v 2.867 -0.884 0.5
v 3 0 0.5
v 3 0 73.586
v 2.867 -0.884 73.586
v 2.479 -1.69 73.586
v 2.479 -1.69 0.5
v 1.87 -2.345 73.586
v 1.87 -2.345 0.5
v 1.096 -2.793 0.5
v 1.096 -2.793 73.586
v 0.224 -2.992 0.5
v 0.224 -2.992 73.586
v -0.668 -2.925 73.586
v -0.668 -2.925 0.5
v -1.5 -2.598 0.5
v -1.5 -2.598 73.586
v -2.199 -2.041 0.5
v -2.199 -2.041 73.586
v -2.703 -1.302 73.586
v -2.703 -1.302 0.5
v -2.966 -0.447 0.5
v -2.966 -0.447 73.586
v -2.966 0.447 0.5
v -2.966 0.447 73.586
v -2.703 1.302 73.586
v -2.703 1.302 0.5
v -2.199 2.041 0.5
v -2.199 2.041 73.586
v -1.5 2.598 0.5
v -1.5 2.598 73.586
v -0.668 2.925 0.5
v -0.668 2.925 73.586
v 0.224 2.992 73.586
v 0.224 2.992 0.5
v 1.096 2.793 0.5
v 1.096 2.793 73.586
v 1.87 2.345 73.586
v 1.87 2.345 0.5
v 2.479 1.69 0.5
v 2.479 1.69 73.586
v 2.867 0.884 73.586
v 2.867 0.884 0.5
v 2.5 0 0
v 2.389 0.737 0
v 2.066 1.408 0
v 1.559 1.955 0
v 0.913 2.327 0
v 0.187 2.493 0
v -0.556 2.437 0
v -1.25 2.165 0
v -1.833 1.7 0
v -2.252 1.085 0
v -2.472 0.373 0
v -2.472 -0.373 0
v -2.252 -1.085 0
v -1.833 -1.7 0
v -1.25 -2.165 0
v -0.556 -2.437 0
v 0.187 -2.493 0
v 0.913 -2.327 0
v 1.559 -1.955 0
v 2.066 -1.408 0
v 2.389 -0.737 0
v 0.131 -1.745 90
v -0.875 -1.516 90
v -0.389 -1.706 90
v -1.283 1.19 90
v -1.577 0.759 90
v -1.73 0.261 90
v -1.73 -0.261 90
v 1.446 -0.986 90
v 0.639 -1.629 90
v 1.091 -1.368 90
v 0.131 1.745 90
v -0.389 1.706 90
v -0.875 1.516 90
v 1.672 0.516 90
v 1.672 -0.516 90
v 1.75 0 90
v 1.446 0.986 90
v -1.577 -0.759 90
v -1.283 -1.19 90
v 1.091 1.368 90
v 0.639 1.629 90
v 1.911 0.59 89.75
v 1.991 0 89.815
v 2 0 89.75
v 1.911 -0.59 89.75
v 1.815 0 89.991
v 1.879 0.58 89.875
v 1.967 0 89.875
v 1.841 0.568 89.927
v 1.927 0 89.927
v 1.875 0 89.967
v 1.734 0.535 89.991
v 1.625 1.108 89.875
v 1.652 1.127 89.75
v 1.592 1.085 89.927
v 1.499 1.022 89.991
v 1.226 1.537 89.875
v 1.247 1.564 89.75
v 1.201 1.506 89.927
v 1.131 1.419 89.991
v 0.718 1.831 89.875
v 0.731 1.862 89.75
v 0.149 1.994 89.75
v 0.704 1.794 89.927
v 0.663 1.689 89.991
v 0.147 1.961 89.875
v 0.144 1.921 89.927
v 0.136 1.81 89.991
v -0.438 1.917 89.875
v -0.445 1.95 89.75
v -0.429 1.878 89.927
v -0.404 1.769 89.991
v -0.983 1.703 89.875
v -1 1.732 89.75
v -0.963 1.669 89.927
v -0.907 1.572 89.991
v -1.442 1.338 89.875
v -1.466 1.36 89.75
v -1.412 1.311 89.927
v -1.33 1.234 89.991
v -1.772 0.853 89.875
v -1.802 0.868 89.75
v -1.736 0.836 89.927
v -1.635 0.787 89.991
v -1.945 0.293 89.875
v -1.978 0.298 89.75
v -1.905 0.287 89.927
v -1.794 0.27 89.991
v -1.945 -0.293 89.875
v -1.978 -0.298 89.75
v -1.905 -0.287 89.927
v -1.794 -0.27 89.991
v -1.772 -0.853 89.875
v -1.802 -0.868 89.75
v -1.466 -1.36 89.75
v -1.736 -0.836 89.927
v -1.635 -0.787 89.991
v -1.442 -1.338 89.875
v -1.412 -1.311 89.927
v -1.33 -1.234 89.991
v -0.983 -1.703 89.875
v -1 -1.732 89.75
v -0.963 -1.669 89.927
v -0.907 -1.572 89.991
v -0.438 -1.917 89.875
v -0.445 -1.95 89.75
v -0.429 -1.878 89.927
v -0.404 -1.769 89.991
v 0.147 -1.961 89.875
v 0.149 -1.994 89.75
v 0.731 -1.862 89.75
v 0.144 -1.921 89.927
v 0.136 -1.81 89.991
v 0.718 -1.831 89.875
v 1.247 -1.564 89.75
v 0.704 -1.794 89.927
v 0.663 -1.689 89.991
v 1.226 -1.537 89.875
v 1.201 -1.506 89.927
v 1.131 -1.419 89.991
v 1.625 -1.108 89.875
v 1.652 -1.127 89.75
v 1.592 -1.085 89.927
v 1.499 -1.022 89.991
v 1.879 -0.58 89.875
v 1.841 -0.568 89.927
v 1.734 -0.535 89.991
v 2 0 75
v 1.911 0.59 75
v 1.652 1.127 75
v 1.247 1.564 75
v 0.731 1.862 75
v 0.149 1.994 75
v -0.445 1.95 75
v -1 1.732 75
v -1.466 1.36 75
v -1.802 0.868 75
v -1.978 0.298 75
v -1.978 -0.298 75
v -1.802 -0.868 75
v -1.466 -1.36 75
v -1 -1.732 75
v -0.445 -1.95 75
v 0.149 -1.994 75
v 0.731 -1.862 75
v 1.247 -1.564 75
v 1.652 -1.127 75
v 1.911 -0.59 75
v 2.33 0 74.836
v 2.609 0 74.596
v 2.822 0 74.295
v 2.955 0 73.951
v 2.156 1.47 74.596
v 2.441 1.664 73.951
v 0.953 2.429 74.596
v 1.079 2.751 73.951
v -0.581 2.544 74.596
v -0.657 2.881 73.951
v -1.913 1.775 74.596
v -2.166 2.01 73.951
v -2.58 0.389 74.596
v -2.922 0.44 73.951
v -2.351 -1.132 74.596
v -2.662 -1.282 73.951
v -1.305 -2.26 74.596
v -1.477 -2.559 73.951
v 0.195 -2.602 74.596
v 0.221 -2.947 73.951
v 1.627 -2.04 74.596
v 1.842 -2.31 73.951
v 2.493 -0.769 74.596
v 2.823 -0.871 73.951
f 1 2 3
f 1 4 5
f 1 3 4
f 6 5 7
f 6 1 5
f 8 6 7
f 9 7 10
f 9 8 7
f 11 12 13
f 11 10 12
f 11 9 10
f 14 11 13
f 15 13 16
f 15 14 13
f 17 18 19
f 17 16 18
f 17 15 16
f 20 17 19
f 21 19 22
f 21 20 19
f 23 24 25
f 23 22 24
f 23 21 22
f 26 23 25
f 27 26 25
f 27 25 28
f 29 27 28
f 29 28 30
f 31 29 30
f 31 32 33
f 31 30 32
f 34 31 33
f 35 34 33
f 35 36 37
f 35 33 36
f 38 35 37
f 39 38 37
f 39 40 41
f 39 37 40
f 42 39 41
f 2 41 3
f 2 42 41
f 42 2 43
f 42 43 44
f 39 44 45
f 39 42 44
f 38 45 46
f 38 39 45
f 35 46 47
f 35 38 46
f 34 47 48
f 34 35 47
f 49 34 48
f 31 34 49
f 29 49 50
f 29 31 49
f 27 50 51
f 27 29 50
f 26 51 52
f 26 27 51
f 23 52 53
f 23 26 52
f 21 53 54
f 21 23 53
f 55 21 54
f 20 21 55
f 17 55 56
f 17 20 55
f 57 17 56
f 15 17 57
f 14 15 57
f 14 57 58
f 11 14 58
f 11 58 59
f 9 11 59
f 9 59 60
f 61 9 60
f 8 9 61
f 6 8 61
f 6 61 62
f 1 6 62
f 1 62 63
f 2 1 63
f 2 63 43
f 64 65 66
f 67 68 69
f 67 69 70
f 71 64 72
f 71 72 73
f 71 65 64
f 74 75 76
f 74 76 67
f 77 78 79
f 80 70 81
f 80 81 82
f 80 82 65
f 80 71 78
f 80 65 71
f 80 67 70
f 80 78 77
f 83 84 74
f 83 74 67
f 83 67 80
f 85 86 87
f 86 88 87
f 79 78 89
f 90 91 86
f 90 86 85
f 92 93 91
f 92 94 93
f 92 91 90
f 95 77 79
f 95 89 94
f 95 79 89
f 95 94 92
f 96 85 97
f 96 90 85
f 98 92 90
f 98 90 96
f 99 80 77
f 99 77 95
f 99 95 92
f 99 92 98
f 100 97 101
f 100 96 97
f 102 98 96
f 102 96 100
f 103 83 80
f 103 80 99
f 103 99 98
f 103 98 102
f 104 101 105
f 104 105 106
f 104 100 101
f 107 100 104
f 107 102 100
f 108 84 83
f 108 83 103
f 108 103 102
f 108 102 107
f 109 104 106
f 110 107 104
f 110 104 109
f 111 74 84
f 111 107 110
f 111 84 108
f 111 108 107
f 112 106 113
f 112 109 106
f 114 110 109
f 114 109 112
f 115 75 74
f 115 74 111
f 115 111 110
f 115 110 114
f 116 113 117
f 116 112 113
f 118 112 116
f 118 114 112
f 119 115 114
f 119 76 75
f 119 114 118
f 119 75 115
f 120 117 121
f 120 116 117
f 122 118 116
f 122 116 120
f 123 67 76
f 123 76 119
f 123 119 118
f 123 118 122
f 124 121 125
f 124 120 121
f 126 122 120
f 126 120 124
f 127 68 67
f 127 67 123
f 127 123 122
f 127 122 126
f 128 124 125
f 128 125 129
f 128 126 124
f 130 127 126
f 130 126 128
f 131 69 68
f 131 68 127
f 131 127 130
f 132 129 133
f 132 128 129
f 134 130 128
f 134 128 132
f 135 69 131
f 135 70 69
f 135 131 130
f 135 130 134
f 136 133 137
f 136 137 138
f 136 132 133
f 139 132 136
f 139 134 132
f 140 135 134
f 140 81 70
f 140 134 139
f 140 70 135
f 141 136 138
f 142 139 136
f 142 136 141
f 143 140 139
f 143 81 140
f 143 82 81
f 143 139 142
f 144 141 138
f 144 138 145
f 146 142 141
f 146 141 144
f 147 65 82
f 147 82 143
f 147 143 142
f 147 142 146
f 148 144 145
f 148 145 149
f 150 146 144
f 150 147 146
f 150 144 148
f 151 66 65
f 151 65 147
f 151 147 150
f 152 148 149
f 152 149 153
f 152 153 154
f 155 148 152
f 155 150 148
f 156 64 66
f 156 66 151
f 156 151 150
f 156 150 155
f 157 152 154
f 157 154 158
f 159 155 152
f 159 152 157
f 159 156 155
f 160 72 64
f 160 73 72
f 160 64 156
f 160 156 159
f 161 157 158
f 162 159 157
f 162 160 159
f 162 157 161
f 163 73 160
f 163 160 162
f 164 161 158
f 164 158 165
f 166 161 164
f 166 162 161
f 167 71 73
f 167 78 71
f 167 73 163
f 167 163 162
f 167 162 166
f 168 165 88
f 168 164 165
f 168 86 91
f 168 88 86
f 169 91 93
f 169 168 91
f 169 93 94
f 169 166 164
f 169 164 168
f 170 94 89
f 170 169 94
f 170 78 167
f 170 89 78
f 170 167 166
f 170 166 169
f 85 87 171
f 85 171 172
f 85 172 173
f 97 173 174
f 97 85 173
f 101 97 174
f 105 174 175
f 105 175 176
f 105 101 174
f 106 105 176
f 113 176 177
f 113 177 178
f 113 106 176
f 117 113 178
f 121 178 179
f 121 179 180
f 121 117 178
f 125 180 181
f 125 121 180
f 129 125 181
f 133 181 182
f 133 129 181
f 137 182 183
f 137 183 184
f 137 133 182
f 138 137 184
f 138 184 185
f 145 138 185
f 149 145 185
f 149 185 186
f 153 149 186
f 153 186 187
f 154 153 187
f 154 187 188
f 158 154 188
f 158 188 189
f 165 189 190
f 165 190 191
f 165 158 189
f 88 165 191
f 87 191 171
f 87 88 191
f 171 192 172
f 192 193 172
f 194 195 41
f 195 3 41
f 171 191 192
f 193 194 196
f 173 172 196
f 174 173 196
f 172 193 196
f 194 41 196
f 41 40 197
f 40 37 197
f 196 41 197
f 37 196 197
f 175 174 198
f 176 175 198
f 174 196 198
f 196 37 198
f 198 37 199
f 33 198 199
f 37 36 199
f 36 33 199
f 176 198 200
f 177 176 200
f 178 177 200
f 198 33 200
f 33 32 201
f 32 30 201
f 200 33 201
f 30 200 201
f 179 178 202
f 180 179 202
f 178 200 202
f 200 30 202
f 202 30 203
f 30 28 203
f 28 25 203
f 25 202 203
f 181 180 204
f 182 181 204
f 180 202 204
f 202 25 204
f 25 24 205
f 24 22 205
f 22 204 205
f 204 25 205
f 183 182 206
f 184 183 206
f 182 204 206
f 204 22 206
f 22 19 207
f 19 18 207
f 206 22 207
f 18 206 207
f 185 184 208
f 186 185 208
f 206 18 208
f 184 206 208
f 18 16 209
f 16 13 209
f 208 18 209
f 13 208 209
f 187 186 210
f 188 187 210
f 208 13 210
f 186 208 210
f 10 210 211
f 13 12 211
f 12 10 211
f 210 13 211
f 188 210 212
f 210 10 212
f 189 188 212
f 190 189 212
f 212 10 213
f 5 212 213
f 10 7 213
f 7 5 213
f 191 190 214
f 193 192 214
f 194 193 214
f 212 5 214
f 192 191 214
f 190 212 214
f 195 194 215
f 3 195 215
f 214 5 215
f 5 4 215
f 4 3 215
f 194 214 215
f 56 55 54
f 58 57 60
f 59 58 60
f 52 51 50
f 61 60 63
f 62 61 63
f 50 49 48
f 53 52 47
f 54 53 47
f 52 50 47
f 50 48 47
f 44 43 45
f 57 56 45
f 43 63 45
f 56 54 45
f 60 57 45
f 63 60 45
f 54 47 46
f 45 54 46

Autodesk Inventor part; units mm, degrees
ref_plane "YZ Plane" through (0, 0, 0) normal (1, 0, 0) x (0, 1, 0)
ref_plane "XZ Plane" through (0, 0, 0) normal (0, 1, 0) x (-1, 0, 0)
ref_plane "XY Plane" through (0, 0, 0) normal (0, 0, 1) x (1, 0, 0)
sketch "Sketch1" plane through (0, 0, 0) normal (0, 0, 1) x (1, 0, 0)
  circle A0 centre (0, 0) radius 3
  dimension "d0" = 6
extrude "Extrusion1" add sketch "Sketch1" along normal blind 90
sketch "Sketch2" plane through (0, 0, 90) normal (0, 0, 1) x (1, 0, 0)
  circle A0 centre (0, 0) radius 2
  circle A1 centre (0, 0) radius 3
  dimension "d3" = 4
extrude "Extrusion2" cut sketch "Sketch2" against normal blind 15
thread "Thread1" size "M4x0.7" class "6g" standard "ANSI Metric M Profile" length 10 offset 6
fillet "Fillet1" radius 0.25 1 edges at (-2, 0, 90)
fillet "Fillet2" radius 1.5 1 edges at (-3, 0, 75)
chamfer "Chamfer1" distance 0.5 angle 45 1 edges at (-3, 0, 0)
properties part number "hridel_pro_kola" material "Iron, Cast"
